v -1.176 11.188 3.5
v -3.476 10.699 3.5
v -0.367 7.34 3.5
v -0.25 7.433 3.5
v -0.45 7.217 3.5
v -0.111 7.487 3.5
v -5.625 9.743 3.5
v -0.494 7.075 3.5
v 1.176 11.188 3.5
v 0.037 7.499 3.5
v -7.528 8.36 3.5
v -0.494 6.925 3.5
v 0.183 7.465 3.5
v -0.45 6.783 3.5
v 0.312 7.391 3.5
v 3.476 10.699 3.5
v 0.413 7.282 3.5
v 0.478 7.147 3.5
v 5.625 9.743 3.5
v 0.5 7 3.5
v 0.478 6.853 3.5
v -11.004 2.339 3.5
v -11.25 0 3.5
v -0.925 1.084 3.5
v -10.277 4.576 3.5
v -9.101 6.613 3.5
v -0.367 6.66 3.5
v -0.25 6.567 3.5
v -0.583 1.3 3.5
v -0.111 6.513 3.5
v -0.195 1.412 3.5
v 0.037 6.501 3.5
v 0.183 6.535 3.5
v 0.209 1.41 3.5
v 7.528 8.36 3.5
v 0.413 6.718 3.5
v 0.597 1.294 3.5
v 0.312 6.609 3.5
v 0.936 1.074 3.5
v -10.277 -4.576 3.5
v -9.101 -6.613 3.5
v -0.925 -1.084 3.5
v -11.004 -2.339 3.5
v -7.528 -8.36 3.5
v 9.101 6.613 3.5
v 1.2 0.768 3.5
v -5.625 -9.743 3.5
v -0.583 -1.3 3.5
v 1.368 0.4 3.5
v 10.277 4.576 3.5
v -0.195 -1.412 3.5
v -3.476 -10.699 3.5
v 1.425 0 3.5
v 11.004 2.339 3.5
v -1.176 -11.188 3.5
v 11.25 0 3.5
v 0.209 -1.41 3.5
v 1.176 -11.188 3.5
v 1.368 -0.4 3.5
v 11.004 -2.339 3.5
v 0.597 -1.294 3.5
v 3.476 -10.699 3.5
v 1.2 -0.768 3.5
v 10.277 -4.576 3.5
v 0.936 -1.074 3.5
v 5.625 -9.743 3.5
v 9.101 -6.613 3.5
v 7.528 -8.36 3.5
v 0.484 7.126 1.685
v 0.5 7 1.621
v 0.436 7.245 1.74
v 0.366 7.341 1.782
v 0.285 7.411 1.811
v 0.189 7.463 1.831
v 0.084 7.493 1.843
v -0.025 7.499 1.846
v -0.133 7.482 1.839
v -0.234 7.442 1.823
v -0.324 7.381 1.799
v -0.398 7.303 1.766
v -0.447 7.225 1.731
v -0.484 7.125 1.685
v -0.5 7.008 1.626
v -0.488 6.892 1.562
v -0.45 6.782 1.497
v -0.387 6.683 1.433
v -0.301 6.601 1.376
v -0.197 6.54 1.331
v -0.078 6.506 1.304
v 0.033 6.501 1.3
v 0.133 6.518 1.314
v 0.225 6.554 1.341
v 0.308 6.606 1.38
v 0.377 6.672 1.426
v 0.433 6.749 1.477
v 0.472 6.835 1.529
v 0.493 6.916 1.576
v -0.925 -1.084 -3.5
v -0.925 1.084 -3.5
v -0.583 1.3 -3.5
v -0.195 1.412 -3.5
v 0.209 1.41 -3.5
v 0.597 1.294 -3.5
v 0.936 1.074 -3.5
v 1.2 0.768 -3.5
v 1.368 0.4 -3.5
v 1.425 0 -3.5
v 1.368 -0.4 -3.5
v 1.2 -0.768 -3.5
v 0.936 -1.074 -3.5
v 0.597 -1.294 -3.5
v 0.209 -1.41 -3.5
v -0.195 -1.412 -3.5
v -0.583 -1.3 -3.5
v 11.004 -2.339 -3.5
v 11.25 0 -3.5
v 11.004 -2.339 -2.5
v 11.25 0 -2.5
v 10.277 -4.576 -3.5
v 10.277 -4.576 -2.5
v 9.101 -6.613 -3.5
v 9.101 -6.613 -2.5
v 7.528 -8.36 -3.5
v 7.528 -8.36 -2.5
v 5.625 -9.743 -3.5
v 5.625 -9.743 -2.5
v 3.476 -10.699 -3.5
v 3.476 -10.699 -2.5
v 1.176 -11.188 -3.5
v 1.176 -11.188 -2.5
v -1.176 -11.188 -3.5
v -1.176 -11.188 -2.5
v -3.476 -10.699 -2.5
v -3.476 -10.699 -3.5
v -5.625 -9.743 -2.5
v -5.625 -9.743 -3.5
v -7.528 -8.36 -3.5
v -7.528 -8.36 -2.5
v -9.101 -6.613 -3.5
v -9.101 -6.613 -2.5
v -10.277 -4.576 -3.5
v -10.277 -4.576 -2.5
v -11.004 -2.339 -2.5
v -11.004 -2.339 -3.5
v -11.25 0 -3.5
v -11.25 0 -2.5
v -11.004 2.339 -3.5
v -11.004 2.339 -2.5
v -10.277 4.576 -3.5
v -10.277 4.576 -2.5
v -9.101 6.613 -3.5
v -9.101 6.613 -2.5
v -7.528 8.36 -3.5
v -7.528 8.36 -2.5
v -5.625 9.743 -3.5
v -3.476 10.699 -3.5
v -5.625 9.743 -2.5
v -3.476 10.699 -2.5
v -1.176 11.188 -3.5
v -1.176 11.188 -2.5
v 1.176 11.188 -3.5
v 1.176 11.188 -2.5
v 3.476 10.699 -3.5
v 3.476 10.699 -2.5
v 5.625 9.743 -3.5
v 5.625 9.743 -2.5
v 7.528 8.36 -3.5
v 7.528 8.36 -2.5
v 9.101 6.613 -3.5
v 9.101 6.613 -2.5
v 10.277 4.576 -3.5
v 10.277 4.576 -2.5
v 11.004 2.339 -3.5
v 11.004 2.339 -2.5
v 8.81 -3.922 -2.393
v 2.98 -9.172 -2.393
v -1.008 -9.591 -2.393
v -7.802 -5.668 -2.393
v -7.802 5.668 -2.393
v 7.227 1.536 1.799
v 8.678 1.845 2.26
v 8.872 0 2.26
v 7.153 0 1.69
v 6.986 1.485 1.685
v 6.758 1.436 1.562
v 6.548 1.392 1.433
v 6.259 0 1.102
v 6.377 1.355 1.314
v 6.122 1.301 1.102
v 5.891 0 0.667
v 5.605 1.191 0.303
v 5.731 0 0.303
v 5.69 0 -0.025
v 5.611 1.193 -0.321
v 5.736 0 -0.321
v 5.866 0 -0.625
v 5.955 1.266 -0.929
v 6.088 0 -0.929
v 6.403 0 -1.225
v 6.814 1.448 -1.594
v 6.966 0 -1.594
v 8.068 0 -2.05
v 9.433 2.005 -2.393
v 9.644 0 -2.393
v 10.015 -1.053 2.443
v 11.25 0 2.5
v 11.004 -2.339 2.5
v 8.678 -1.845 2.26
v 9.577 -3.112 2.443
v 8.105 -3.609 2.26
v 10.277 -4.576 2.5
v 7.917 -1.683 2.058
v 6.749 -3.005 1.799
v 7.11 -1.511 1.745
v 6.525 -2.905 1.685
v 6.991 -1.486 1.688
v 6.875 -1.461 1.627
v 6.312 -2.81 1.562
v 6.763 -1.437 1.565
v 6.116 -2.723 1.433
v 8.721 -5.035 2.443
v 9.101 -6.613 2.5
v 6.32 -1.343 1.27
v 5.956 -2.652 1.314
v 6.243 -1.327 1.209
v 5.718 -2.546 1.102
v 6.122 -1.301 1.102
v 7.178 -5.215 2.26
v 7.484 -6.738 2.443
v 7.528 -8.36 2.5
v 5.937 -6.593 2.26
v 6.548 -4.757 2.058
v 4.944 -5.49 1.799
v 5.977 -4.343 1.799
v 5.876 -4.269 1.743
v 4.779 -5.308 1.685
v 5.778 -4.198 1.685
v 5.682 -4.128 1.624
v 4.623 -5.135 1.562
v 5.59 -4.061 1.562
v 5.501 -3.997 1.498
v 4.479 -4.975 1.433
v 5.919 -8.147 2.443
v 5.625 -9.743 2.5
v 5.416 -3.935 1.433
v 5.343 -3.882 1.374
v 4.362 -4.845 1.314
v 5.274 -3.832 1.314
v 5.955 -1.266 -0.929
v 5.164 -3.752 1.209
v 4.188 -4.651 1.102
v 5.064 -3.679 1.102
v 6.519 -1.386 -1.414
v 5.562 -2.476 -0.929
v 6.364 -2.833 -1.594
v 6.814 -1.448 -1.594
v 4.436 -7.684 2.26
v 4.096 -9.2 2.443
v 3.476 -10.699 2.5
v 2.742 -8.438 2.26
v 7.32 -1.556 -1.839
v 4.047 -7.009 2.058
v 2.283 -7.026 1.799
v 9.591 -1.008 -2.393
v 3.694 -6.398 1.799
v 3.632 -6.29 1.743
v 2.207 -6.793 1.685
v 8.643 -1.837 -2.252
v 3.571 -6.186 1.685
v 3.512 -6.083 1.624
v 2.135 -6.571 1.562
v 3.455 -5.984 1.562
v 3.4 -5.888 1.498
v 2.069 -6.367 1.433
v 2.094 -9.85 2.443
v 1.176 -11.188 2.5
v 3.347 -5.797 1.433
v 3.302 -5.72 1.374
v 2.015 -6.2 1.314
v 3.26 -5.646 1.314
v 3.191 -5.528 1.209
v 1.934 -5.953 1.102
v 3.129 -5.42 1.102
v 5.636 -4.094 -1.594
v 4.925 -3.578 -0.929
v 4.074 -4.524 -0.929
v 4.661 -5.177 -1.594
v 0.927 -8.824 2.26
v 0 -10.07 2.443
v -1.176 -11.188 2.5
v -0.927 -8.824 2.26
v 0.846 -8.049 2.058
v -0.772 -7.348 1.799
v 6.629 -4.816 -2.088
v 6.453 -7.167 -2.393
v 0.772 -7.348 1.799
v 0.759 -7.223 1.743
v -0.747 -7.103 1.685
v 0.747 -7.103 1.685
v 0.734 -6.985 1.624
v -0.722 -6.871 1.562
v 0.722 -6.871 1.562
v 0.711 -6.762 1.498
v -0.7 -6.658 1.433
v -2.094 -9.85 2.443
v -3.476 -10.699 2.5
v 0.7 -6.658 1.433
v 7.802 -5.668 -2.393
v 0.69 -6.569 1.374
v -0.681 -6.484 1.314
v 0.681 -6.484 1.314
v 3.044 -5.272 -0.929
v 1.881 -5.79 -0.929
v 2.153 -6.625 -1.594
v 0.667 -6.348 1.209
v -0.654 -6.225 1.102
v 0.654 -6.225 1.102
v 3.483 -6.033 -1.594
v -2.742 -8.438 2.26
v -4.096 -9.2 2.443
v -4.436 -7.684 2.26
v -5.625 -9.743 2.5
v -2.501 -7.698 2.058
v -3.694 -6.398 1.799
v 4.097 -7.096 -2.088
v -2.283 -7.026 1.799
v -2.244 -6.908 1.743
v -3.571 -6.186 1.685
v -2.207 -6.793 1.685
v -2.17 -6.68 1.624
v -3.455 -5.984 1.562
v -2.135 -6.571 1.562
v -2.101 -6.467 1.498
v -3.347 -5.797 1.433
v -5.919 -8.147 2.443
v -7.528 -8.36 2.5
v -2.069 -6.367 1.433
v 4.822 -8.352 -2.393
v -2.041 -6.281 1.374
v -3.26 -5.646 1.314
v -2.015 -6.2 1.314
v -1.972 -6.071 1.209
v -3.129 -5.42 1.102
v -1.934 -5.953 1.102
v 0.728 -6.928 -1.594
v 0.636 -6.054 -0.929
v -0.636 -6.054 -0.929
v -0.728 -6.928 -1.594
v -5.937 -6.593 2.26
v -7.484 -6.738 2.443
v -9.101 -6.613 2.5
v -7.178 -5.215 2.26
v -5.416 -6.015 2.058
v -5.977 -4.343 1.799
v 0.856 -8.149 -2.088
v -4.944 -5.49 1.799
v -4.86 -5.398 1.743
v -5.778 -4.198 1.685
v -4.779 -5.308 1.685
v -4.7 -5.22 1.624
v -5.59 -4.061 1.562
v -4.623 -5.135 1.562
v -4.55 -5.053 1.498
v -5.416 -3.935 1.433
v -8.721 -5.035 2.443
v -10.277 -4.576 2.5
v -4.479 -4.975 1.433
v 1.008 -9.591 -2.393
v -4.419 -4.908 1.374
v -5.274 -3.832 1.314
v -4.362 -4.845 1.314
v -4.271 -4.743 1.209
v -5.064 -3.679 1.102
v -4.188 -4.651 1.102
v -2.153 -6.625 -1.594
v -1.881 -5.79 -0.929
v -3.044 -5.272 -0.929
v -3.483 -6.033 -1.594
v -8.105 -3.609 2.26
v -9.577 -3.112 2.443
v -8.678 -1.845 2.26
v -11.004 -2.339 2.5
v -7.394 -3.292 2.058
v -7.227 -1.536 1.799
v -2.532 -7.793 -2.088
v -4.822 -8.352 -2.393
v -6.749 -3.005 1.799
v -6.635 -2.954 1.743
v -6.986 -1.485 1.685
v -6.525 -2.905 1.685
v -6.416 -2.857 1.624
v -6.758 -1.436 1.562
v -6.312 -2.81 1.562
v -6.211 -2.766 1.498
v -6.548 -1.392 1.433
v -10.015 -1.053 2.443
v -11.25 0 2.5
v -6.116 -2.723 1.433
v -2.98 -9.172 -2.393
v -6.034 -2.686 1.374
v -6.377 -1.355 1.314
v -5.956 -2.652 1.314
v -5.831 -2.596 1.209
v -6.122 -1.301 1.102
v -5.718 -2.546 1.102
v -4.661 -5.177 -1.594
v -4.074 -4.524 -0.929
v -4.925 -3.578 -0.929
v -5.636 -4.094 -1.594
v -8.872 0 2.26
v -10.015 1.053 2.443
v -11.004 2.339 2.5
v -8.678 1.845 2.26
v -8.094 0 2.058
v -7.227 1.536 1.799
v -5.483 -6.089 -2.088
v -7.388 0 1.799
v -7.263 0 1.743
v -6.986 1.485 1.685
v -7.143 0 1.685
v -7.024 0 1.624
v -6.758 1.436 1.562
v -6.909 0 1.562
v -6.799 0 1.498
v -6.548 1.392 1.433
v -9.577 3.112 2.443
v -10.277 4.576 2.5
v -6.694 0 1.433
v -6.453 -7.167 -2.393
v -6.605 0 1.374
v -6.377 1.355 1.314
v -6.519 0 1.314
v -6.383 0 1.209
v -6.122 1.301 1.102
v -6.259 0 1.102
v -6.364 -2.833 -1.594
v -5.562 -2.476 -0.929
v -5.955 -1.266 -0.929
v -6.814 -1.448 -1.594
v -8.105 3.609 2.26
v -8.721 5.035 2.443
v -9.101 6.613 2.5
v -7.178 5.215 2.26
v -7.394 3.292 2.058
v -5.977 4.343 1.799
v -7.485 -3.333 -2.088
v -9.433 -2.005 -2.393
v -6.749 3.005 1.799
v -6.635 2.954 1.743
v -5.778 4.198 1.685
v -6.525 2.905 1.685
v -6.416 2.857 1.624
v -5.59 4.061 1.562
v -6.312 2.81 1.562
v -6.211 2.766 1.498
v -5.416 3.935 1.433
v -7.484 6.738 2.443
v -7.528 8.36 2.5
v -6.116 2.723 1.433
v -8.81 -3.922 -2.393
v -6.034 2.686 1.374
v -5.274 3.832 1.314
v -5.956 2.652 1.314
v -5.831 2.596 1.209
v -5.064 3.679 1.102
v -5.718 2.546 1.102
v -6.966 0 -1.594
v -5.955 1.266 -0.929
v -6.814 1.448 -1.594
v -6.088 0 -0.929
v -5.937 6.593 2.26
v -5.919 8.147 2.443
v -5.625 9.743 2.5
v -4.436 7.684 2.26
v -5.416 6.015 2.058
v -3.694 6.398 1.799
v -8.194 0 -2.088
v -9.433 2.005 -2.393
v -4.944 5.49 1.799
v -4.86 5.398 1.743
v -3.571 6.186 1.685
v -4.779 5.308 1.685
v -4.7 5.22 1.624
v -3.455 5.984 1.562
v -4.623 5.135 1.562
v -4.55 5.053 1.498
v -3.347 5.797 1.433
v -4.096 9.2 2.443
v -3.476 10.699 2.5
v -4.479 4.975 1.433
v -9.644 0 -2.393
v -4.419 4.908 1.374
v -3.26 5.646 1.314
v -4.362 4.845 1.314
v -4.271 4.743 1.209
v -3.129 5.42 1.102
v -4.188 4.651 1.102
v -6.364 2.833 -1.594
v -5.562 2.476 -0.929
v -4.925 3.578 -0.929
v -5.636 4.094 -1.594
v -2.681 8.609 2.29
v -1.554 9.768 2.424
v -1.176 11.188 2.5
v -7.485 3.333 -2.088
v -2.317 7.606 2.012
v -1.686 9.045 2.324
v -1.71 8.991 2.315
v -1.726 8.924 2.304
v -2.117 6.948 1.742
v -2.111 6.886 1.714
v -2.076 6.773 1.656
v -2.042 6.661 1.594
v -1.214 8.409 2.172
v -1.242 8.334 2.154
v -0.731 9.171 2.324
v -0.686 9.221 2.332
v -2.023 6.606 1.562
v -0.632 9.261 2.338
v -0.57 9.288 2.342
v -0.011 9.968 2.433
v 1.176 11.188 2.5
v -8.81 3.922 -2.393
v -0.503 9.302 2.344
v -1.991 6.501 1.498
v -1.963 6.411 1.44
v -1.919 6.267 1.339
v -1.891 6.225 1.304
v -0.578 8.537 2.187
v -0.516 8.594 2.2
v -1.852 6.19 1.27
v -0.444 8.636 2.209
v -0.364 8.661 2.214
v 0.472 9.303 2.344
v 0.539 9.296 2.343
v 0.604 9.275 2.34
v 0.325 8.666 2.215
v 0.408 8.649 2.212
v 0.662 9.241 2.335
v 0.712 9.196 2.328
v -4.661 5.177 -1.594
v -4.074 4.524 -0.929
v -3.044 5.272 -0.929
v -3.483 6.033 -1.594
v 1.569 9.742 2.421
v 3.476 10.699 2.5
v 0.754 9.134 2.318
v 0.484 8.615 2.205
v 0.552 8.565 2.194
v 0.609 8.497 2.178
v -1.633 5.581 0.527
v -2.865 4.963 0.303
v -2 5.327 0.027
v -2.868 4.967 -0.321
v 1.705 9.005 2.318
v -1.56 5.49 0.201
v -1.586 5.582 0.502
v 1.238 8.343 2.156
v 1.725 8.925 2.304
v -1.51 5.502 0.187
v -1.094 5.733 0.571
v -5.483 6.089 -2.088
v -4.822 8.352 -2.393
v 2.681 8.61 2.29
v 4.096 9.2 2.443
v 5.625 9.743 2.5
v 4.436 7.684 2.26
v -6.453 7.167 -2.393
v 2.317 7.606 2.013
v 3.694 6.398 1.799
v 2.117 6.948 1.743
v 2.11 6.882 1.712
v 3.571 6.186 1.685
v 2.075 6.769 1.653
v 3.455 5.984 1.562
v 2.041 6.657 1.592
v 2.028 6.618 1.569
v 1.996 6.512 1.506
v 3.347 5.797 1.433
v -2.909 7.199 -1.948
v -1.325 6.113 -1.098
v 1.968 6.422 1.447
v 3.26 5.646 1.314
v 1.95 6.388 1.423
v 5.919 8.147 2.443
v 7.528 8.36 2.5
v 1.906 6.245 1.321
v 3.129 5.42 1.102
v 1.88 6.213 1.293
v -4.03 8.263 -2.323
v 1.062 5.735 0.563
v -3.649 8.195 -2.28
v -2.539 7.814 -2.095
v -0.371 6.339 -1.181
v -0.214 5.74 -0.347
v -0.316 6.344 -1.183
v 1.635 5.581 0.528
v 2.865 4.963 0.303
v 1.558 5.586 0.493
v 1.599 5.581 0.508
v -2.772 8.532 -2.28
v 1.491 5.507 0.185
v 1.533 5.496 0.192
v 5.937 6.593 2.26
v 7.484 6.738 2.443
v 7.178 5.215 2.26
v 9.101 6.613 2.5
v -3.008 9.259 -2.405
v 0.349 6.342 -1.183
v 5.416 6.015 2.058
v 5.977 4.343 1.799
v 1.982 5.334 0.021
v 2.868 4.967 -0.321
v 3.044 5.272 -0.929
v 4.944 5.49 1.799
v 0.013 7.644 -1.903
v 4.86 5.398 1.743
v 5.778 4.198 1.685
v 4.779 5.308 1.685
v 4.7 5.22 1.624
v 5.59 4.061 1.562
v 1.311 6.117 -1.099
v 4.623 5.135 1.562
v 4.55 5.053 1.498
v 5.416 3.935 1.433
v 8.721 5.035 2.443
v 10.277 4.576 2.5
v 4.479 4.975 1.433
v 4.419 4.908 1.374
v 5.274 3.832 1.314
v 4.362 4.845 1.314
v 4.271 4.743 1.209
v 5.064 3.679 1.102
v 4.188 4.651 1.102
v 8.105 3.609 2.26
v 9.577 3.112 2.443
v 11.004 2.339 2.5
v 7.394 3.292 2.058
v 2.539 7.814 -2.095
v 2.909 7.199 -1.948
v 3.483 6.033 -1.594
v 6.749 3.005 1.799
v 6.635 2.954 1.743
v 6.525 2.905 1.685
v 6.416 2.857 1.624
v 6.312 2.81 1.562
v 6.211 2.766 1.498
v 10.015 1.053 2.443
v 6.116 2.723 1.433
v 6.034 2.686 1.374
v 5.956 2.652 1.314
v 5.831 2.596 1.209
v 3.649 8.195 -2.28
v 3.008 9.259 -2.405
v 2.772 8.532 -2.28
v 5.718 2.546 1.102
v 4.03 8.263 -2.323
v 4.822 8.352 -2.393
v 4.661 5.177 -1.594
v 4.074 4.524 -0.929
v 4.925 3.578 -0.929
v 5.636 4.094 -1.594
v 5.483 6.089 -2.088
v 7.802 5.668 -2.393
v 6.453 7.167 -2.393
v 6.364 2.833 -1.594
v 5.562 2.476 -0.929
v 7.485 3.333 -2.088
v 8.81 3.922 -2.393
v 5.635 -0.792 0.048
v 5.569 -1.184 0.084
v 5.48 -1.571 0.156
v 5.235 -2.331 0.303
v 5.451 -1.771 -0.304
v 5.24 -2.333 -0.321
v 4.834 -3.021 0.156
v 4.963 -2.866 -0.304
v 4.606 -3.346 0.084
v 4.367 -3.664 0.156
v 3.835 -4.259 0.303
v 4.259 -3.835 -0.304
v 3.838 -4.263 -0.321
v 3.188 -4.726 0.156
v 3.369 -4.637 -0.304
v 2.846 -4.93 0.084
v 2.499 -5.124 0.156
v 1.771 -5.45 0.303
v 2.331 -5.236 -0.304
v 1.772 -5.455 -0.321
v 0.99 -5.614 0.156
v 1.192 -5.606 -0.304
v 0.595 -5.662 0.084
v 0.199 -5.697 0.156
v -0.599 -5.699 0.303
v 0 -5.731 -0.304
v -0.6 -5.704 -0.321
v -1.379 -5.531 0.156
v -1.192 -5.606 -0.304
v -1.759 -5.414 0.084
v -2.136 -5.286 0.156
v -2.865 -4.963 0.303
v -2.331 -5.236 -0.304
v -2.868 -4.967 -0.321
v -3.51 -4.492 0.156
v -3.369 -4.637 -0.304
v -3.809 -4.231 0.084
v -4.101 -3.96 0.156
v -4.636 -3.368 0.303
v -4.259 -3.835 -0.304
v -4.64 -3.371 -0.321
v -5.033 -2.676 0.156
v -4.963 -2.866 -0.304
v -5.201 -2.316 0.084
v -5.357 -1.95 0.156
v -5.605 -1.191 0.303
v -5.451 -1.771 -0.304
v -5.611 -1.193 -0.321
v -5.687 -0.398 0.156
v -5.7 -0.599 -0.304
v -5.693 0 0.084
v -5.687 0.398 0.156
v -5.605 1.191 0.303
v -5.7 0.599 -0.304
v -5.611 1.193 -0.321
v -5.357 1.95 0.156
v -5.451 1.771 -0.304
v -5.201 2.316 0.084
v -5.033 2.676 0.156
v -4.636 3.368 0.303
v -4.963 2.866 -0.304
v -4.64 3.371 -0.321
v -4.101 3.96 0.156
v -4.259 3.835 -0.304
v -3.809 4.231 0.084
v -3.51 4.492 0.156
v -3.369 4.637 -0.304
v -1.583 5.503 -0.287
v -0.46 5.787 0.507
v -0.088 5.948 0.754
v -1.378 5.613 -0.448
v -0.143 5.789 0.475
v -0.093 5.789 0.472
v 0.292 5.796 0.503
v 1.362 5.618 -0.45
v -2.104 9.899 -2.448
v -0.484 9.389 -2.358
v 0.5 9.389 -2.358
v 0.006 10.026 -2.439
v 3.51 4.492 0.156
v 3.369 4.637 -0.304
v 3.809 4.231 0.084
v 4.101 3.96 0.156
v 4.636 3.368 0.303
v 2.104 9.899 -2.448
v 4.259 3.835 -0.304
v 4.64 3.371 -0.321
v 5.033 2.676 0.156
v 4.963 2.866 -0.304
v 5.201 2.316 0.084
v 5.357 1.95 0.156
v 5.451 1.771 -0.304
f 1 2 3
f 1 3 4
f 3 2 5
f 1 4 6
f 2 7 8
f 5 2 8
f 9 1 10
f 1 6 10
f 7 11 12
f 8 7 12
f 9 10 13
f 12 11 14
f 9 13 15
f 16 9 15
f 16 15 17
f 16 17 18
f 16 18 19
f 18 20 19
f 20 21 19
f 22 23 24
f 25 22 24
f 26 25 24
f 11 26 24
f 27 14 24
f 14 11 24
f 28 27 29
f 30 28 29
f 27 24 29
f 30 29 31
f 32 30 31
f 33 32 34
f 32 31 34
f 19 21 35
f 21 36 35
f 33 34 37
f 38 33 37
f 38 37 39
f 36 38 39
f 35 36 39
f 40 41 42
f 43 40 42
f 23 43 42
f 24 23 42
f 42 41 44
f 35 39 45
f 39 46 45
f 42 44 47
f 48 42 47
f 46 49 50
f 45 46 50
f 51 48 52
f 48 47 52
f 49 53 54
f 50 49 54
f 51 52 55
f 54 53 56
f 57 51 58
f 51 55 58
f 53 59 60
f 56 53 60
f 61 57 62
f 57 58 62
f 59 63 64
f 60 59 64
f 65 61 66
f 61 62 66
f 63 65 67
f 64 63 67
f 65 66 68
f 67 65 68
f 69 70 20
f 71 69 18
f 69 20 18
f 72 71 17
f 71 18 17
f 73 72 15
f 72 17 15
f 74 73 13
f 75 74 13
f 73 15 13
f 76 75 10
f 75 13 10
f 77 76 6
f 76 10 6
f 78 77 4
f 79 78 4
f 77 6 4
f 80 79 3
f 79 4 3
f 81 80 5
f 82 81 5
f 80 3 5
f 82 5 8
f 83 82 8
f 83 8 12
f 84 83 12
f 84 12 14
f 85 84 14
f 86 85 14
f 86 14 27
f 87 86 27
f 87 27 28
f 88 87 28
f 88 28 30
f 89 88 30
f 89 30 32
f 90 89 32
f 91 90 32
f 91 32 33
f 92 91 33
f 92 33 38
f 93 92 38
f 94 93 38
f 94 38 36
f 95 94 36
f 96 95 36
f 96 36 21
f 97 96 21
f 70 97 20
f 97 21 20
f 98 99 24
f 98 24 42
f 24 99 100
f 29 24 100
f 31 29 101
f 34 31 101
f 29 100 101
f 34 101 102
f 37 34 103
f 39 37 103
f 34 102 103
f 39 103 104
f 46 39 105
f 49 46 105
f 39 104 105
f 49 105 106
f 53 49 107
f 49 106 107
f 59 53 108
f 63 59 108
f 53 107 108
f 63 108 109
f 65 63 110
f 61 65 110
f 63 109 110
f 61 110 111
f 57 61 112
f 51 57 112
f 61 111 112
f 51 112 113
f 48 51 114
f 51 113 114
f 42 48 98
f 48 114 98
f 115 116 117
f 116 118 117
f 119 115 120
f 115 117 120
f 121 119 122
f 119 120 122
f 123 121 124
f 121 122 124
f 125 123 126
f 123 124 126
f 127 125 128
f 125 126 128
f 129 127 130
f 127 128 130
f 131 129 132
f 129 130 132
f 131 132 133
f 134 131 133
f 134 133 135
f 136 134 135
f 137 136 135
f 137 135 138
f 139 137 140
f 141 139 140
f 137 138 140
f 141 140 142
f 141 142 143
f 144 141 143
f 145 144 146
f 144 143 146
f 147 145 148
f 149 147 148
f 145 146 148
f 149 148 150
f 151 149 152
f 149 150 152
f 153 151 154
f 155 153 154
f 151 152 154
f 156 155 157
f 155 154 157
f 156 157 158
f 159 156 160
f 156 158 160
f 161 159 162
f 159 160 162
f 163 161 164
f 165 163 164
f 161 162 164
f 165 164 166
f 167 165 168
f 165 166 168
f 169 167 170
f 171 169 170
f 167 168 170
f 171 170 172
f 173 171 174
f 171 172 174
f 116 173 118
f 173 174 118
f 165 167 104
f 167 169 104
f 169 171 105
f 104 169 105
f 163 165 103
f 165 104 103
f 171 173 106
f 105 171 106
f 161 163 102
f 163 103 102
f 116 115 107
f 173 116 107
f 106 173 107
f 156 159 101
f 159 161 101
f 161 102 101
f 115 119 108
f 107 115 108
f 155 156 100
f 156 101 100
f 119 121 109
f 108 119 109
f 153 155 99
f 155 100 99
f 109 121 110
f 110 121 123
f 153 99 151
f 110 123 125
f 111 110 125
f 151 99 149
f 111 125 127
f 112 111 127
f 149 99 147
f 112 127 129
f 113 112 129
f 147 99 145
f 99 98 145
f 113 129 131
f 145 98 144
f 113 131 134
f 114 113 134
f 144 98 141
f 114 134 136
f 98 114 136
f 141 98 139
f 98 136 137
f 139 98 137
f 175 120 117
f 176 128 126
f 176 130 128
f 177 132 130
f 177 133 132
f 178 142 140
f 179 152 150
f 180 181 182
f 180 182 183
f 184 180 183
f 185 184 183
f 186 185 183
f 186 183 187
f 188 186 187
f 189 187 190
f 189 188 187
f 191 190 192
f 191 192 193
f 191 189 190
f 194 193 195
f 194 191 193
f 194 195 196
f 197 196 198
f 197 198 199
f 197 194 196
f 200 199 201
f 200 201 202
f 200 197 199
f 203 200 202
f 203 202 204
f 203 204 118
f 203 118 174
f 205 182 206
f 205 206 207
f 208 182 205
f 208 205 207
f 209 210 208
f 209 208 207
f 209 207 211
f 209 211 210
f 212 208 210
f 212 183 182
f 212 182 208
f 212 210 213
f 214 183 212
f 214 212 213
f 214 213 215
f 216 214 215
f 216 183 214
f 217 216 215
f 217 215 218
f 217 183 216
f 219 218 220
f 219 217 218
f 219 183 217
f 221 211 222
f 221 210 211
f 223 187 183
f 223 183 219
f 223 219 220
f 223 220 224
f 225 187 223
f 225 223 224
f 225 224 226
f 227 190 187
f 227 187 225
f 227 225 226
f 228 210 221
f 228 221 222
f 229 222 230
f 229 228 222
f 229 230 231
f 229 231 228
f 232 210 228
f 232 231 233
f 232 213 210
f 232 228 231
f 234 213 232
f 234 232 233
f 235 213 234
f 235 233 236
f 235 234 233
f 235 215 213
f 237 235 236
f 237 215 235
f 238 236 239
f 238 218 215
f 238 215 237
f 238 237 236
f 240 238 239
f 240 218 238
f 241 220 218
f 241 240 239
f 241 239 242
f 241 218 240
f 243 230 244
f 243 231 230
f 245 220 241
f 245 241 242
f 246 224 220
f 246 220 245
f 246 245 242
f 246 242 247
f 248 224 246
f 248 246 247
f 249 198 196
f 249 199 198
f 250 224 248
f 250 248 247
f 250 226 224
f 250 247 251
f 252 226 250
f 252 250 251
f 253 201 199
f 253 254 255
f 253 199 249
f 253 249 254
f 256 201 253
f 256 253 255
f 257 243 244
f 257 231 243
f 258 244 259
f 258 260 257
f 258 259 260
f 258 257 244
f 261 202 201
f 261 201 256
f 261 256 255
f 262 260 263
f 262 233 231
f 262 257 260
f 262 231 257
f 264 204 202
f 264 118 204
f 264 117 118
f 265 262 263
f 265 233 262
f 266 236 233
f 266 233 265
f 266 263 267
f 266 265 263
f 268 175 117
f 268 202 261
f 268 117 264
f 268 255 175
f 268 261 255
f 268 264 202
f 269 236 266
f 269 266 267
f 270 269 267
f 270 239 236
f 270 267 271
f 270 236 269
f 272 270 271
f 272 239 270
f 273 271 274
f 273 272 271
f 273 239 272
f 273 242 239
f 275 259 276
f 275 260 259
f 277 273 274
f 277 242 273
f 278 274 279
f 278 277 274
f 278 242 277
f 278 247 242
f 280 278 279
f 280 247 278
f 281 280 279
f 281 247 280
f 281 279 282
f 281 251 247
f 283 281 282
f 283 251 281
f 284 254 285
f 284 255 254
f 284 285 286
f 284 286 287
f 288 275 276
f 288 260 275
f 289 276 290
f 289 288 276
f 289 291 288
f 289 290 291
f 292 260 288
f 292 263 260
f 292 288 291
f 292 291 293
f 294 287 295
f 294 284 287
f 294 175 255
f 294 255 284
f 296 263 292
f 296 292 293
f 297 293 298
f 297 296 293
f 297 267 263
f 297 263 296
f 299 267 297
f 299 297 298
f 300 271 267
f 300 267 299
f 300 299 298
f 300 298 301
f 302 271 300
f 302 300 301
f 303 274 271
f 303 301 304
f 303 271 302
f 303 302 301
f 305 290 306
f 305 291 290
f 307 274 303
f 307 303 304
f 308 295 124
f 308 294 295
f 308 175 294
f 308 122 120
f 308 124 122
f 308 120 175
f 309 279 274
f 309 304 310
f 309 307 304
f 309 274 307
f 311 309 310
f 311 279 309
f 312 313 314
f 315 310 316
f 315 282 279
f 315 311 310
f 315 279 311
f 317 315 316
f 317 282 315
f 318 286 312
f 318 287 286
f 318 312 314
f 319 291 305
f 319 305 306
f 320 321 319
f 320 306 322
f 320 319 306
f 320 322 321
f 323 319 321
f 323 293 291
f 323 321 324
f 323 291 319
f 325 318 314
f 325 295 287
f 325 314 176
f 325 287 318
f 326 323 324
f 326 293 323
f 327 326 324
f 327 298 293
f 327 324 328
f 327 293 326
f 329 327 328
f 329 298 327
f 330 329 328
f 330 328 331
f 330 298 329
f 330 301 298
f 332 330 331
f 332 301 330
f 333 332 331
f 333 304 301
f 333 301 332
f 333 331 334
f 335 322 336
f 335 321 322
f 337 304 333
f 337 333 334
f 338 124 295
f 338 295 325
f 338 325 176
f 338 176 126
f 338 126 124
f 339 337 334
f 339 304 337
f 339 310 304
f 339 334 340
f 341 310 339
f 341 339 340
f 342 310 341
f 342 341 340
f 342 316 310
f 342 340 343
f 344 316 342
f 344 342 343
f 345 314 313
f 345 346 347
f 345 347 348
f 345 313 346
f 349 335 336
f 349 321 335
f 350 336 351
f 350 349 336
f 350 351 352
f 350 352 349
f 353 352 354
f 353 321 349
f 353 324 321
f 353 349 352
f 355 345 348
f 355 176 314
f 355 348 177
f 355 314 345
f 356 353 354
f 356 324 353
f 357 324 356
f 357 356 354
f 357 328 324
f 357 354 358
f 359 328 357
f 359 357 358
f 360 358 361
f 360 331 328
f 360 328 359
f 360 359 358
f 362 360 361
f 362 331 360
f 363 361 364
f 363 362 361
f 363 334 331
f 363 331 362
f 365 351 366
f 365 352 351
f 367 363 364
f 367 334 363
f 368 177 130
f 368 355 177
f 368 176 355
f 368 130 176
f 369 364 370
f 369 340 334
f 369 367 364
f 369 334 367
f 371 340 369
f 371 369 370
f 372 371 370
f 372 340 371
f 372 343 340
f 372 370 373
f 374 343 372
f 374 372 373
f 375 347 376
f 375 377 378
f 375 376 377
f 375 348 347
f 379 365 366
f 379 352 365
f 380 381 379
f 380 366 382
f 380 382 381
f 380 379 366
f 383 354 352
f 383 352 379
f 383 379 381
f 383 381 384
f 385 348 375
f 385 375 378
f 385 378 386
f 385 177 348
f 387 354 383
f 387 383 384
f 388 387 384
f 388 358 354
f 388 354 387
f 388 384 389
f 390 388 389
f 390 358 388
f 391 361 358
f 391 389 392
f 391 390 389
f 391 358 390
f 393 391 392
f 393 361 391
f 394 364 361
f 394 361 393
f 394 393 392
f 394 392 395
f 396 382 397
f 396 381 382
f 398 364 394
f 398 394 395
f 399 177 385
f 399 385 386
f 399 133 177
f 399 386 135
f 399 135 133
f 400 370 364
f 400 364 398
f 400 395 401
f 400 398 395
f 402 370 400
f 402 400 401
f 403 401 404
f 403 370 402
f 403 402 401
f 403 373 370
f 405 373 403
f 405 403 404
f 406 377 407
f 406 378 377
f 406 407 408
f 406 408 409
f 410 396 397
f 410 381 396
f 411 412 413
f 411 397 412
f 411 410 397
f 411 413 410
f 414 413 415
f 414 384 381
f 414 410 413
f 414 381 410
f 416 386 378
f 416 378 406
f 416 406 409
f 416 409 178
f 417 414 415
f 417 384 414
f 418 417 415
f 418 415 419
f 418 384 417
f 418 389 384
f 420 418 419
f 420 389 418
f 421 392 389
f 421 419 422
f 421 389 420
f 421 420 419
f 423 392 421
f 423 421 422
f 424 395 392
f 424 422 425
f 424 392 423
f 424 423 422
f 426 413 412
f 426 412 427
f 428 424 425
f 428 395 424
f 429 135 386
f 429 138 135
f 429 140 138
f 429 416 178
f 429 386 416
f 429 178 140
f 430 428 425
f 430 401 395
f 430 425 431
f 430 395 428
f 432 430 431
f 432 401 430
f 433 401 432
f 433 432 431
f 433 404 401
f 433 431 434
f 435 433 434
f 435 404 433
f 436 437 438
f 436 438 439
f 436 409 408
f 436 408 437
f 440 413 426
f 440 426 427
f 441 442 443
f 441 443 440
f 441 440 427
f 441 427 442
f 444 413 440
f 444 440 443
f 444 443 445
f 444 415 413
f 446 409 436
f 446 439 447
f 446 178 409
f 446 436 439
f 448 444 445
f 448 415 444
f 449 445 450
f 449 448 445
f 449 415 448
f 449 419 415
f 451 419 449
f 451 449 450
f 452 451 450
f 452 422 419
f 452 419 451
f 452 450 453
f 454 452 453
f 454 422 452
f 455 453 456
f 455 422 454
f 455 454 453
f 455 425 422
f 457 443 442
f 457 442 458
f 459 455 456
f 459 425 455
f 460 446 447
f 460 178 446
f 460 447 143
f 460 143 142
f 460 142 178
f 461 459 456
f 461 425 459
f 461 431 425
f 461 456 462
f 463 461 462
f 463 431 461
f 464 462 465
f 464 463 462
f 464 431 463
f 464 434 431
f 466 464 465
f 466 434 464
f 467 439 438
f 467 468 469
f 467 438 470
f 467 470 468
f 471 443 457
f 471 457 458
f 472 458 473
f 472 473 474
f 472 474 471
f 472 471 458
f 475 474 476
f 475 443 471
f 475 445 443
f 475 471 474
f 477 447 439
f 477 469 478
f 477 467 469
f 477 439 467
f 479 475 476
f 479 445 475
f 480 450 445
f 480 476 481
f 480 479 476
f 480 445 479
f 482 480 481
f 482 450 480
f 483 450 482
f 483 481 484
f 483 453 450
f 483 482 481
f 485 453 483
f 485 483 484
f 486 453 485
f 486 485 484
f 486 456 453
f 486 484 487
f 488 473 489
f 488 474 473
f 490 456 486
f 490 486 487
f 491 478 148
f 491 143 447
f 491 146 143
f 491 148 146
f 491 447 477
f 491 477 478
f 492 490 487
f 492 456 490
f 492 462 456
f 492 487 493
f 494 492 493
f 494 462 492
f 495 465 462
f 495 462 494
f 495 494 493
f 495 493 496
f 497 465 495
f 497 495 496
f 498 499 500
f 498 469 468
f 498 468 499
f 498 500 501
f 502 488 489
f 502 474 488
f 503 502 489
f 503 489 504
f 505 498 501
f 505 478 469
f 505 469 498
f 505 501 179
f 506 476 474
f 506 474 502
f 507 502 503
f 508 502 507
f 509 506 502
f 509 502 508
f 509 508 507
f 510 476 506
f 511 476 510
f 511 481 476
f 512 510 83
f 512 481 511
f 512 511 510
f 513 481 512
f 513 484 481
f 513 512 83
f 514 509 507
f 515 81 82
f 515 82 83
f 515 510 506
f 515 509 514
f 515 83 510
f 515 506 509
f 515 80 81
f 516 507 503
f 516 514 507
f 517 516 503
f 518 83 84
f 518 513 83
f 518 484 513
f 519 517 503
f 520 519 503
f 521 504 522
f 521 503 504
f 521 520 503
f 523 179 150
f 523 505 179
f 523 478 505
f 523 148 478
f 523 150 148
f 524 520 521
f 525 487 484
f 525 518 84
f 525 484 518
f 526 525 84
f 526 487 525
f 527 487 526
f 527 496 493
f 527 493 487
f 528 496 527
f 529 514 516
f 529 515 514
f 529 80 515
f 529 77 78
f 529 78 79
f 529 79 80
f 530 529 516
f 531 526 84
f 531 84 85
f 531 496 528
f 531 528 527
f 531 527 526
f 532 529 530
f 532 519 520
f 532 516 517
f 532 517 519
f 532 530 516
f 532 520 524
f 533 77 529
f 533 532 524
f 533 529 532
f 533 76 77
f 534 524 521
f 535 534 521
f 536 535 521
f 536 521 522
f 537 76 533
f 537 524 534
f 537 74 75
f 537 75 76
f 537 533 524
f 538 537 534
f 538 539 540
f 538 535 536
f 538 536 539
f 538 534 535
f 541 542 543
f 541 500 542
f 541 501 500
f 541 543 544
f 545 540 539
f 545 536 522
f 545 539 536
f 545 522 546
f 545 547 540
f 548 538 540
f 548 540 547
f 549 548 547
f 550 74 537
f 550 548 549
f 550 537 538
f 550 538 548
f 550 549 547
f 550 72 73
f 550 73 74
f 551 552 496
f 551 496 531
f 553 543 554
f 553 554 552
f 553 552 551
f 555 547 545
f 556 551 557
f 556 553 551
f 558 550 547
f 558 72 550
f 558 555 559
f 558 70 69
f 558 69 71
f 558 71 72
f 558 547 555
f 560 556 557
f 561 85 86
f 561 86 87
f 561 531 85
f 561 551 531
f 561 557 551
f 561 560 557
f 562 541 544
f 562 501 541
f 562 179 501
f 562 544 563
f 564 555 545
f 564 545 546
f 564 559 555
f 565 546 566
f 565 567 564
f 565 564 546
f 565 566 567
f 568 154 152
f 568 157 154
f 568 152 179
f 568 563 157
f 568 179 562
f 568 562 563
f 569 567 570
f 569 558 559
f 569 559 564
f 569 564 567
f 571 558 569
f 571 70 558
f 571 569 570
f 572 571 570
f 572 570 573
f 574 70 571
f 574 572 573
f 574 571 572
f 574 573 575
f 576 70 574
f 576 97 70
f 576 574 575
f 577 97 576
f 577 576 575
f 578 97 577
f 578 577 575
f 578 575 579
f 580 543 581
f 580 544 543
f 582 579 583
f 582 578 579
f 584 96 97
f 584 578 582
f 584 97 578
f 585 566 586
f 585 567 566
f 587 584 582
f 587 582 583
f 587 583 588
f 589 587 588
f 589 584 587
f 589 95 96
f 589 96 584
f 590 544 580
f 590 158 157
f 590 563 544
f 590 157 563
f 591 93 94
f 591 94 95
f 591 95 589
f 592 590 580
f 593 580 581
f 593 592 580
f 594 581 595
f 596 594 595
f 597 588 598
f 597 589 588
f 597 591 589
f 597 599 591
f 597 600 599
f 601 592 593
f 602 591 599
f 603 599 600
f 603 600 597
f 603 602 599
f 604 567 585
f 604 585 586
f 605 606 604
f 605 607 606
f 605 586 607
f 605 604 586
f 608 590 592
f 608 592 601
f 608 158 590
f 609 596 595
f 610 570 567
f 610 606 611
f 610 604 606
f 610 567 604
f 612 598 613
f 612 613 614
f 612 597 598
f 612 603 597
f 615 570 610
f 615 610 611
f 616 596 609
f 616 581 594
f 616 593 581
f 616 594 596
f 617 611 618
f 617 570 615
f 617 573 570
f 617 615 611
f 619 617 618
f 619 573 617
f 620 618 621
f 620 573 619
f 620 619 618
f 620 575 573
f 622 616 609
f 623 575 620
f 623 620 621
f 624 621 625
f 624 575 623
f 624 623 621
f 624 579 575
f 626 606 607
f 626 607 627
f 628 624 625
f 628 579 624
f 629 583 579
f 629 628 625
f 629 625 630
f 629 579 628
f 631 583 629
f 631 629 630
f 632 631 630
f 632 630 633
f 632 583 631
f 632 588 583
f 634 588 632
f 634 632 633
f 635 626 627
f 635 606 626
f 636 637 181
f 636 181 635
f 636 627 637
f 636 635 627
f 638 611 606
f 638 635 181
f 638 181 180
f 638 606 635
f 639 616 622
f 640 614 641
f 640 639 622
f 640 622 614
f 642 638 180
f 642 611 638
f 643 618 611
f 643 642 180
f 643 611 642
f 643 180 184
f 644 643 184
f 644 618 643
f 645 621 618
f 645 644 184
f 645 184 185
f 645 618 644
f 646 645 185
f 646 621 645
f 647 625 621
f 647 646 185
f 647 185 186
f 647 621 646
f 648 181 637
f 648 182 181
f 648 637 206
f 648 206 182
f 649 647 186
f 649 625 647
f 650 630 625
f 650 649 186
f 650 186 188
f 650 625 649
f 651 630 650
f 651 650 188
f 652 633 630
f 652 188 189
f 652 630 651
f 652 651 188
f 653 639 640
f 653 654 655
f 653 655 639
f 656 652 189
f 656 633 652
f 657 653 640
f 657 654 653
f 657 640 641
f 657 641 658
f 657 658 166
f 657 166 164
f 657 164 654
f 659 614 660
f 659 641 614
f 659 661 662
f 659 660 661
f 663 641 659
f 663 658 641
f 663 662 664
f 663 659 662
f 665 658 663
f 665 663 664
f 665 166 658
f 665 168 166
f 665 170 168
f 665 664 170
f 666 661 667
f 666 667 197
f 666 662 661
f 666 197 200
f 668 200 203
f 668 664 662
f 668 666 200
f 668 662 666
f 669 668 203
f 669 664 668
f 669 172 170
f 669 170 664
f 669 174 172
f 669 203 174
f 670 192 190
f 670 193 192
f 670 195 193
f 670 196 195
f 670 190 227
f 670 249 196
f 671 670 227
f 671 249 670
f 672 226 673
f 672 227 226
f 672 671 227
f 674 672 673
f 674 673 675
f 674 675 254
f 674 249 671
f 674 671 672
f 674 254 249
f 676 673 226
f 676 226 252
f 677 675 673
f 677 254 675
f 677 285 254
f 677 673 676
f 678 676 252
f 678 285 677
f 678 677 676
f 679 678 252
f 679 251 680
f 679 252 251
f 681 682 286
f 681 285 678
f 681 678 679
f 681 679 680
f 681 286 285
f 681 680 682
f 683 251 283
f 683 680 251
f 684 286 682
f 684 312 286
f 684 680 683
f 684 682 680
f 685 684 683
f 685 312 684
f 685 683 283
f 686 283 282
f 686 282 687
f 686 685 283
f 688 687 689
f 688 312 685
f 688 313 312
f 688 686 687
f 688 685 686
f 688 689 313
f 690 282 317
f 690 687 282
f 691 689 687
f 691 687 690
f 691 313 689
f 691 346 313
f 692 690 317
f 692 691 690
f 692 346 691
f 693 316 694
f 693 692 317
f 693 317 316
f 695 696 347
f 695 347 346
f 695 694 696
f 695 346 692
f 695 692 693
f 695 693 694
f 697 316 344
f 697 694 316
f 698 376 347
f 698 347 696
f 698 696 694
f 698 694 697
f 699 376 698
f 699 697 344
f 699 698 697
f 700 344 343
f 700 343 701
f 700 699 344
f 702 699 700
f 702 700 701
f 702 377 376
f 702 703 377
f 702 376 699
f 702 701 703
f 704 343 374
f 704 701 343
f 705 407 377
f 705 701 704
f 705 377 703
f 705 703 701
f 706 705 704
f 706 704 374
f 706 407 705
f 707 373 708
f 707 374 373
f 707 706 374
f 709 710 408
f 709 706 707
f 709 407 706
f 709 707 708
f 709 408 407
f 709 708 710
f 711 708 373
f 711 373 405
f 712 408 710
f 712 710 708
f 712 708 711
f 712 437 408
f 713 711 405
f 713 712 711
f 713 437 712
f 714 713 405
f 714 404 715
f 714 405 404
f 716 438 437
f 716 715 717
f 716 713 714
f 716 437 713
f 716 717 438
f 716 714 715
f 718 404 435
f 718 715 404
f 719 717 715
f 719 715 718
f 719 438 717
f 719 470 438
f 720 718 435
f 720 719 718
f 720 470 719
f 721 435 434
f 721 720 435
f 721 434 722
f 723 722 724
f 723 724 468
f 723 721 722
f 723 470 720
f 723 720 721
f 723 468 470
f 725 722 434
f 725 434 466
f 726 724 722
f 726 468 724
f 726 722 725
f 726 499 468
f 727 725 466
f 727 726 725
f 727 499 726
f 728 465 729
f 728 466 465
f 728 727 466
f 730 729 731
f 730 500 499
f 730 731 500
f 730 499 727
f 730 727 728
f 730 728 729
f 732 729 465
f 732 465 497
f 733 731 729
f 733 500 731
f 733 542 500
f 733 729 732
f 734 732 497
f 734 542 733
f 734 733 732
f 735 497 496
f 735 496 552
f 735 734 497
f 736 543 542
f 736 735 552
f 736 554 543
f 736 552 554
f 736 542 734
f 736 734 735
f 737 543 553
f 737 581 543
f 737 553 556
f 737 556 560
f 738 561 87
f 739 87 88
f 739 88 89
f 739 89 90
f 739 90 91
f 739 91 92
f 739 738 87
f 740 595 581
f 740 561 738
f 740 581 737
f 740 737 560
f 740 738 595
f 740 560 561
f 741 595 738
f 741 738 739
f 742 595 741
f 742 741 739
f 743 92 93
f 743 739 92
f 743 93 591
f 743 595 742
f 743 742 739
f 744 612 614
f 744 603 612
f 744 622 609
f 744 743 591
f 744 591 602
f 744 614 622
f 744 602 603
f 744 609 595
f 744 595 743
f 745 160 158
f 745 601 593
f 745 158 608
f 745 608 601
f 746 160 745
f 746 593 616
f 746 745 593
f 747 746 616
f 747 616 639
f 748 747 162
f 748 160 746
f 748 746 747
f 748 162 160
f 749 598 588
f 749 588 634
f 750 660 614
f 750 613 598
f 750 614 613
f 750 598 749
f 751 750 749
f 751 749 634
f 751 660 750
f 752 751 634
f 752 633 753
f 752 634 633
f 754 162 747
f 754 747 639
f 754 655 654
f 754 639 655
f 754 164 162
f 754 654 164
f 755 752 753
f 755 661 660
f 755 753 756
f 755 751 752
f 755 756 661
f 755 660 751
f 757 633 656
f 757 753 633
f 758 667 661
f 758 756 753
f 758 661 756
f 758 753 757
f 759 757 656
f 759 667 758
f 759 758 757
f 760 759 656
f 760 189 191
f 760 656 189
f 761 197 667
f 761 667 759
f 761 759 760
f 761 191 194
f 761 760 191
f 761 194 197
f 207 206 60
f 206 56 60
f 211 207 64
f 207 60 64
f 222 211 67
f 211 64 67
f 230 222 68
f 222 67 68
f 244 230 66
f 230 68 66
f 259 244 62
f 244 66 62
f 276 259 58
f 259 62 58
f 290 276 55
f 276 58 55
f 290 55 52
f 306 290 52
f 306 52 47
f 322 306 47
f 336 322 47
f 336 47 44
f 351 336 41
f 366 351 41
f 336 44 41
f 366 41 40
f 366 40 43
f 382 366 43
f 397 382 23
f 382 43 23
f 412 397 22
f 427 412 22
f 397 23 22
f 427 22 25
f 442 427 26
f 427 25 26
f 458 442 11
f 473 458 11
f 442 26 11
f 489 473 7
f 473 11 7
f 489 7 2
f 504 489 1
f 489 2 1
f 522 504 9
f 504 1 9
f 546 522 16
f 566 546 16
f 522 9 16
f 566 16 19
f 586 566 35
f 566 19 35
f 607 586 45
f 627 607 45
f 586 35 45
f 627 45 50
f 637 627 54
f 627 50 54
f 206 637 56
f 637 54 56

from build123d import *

# Parameters (mm, degrees)
BOSS_EXTRUDE1_START = -7
BOSS_EXTRUDE1_DEPTH = 7
SKETCH8_R           = 0.5
CUT_EXTRUDE1_DEPTH  = 3


with BuildPart() as part:
    # Sketch4 → Revolve1 (revolve)
    with BuildSketch(Plane(origin=(0, 0, 0), x_dir=(0, 0, -1), z_dir=(1, 0, 0)), mode=Mode.PRIVATE) as revolve1_sk:
        with BuildLine():
            Line((-2.5, 11.25), (-3.5, 11.25))
            Line((-3.5, 11.25), (-3.5, 1.425))
            Line((-3.5, 1.425), (3.5, 1.425))
            Line((3.5, 1.425), (3.5, 11.25))
            Line((3.5, 11.25), (2.5, 11.25))
            add(Edge.make_bspline(
                [(0, 5.689829973), (2.5, 5.689829973), (2.5, 11.25)],
                knots=[0, 0, 0, 1.570796327, 1.570796327, 1.570796327], degree=2, weights=[1, 0.707106781, 1]))
            add(Edge.make_bspline(
                [(-2.5, 11.25), (-2.5, 5.689829973), (0, 5.689829973)],
                knots=[4.71238898, 4.71238898, 4.71238898, 6.283185307, 6.283185307, 6.283185307], degree=2, weights=[1, 0.707106781, 1]))
        make_face()
    revolve(revolve1_sk.sketch.rotate(Axis((0, 0, 0), (0, 0, -1)), 90), axis=Axis((0, 0, 0), (0, 0, -1)))

    # Sketch7 → Boss-Extrude1 (add)
    with BuildSketch(Plane.XY.offset(3.5).offset(BOSS_EXTRUDE1_START)):
        with BuildLine():
            Line((-0.925, 1.083974169), (-0.925, -1.083974169))
            ThreePointArc((-0.925, -1.083974169), (-1.425, 0), (-0.925, 1.083974169))
        make_face()
    extrude(amount=BOSS_EXTRUDE1_DEPTH)

    # Sketch8 → Cut-Extrude1 (cut)
    with BuildSketch(Plane.XY.offset(3.5)):
        with Locations((0, 7)):
            Circle(SKETCH8_R)
    extrude(amount=-CUT_EXTRUDE1_DEPTH, mode=Mode.SUBTRACT)


solid = part.part
